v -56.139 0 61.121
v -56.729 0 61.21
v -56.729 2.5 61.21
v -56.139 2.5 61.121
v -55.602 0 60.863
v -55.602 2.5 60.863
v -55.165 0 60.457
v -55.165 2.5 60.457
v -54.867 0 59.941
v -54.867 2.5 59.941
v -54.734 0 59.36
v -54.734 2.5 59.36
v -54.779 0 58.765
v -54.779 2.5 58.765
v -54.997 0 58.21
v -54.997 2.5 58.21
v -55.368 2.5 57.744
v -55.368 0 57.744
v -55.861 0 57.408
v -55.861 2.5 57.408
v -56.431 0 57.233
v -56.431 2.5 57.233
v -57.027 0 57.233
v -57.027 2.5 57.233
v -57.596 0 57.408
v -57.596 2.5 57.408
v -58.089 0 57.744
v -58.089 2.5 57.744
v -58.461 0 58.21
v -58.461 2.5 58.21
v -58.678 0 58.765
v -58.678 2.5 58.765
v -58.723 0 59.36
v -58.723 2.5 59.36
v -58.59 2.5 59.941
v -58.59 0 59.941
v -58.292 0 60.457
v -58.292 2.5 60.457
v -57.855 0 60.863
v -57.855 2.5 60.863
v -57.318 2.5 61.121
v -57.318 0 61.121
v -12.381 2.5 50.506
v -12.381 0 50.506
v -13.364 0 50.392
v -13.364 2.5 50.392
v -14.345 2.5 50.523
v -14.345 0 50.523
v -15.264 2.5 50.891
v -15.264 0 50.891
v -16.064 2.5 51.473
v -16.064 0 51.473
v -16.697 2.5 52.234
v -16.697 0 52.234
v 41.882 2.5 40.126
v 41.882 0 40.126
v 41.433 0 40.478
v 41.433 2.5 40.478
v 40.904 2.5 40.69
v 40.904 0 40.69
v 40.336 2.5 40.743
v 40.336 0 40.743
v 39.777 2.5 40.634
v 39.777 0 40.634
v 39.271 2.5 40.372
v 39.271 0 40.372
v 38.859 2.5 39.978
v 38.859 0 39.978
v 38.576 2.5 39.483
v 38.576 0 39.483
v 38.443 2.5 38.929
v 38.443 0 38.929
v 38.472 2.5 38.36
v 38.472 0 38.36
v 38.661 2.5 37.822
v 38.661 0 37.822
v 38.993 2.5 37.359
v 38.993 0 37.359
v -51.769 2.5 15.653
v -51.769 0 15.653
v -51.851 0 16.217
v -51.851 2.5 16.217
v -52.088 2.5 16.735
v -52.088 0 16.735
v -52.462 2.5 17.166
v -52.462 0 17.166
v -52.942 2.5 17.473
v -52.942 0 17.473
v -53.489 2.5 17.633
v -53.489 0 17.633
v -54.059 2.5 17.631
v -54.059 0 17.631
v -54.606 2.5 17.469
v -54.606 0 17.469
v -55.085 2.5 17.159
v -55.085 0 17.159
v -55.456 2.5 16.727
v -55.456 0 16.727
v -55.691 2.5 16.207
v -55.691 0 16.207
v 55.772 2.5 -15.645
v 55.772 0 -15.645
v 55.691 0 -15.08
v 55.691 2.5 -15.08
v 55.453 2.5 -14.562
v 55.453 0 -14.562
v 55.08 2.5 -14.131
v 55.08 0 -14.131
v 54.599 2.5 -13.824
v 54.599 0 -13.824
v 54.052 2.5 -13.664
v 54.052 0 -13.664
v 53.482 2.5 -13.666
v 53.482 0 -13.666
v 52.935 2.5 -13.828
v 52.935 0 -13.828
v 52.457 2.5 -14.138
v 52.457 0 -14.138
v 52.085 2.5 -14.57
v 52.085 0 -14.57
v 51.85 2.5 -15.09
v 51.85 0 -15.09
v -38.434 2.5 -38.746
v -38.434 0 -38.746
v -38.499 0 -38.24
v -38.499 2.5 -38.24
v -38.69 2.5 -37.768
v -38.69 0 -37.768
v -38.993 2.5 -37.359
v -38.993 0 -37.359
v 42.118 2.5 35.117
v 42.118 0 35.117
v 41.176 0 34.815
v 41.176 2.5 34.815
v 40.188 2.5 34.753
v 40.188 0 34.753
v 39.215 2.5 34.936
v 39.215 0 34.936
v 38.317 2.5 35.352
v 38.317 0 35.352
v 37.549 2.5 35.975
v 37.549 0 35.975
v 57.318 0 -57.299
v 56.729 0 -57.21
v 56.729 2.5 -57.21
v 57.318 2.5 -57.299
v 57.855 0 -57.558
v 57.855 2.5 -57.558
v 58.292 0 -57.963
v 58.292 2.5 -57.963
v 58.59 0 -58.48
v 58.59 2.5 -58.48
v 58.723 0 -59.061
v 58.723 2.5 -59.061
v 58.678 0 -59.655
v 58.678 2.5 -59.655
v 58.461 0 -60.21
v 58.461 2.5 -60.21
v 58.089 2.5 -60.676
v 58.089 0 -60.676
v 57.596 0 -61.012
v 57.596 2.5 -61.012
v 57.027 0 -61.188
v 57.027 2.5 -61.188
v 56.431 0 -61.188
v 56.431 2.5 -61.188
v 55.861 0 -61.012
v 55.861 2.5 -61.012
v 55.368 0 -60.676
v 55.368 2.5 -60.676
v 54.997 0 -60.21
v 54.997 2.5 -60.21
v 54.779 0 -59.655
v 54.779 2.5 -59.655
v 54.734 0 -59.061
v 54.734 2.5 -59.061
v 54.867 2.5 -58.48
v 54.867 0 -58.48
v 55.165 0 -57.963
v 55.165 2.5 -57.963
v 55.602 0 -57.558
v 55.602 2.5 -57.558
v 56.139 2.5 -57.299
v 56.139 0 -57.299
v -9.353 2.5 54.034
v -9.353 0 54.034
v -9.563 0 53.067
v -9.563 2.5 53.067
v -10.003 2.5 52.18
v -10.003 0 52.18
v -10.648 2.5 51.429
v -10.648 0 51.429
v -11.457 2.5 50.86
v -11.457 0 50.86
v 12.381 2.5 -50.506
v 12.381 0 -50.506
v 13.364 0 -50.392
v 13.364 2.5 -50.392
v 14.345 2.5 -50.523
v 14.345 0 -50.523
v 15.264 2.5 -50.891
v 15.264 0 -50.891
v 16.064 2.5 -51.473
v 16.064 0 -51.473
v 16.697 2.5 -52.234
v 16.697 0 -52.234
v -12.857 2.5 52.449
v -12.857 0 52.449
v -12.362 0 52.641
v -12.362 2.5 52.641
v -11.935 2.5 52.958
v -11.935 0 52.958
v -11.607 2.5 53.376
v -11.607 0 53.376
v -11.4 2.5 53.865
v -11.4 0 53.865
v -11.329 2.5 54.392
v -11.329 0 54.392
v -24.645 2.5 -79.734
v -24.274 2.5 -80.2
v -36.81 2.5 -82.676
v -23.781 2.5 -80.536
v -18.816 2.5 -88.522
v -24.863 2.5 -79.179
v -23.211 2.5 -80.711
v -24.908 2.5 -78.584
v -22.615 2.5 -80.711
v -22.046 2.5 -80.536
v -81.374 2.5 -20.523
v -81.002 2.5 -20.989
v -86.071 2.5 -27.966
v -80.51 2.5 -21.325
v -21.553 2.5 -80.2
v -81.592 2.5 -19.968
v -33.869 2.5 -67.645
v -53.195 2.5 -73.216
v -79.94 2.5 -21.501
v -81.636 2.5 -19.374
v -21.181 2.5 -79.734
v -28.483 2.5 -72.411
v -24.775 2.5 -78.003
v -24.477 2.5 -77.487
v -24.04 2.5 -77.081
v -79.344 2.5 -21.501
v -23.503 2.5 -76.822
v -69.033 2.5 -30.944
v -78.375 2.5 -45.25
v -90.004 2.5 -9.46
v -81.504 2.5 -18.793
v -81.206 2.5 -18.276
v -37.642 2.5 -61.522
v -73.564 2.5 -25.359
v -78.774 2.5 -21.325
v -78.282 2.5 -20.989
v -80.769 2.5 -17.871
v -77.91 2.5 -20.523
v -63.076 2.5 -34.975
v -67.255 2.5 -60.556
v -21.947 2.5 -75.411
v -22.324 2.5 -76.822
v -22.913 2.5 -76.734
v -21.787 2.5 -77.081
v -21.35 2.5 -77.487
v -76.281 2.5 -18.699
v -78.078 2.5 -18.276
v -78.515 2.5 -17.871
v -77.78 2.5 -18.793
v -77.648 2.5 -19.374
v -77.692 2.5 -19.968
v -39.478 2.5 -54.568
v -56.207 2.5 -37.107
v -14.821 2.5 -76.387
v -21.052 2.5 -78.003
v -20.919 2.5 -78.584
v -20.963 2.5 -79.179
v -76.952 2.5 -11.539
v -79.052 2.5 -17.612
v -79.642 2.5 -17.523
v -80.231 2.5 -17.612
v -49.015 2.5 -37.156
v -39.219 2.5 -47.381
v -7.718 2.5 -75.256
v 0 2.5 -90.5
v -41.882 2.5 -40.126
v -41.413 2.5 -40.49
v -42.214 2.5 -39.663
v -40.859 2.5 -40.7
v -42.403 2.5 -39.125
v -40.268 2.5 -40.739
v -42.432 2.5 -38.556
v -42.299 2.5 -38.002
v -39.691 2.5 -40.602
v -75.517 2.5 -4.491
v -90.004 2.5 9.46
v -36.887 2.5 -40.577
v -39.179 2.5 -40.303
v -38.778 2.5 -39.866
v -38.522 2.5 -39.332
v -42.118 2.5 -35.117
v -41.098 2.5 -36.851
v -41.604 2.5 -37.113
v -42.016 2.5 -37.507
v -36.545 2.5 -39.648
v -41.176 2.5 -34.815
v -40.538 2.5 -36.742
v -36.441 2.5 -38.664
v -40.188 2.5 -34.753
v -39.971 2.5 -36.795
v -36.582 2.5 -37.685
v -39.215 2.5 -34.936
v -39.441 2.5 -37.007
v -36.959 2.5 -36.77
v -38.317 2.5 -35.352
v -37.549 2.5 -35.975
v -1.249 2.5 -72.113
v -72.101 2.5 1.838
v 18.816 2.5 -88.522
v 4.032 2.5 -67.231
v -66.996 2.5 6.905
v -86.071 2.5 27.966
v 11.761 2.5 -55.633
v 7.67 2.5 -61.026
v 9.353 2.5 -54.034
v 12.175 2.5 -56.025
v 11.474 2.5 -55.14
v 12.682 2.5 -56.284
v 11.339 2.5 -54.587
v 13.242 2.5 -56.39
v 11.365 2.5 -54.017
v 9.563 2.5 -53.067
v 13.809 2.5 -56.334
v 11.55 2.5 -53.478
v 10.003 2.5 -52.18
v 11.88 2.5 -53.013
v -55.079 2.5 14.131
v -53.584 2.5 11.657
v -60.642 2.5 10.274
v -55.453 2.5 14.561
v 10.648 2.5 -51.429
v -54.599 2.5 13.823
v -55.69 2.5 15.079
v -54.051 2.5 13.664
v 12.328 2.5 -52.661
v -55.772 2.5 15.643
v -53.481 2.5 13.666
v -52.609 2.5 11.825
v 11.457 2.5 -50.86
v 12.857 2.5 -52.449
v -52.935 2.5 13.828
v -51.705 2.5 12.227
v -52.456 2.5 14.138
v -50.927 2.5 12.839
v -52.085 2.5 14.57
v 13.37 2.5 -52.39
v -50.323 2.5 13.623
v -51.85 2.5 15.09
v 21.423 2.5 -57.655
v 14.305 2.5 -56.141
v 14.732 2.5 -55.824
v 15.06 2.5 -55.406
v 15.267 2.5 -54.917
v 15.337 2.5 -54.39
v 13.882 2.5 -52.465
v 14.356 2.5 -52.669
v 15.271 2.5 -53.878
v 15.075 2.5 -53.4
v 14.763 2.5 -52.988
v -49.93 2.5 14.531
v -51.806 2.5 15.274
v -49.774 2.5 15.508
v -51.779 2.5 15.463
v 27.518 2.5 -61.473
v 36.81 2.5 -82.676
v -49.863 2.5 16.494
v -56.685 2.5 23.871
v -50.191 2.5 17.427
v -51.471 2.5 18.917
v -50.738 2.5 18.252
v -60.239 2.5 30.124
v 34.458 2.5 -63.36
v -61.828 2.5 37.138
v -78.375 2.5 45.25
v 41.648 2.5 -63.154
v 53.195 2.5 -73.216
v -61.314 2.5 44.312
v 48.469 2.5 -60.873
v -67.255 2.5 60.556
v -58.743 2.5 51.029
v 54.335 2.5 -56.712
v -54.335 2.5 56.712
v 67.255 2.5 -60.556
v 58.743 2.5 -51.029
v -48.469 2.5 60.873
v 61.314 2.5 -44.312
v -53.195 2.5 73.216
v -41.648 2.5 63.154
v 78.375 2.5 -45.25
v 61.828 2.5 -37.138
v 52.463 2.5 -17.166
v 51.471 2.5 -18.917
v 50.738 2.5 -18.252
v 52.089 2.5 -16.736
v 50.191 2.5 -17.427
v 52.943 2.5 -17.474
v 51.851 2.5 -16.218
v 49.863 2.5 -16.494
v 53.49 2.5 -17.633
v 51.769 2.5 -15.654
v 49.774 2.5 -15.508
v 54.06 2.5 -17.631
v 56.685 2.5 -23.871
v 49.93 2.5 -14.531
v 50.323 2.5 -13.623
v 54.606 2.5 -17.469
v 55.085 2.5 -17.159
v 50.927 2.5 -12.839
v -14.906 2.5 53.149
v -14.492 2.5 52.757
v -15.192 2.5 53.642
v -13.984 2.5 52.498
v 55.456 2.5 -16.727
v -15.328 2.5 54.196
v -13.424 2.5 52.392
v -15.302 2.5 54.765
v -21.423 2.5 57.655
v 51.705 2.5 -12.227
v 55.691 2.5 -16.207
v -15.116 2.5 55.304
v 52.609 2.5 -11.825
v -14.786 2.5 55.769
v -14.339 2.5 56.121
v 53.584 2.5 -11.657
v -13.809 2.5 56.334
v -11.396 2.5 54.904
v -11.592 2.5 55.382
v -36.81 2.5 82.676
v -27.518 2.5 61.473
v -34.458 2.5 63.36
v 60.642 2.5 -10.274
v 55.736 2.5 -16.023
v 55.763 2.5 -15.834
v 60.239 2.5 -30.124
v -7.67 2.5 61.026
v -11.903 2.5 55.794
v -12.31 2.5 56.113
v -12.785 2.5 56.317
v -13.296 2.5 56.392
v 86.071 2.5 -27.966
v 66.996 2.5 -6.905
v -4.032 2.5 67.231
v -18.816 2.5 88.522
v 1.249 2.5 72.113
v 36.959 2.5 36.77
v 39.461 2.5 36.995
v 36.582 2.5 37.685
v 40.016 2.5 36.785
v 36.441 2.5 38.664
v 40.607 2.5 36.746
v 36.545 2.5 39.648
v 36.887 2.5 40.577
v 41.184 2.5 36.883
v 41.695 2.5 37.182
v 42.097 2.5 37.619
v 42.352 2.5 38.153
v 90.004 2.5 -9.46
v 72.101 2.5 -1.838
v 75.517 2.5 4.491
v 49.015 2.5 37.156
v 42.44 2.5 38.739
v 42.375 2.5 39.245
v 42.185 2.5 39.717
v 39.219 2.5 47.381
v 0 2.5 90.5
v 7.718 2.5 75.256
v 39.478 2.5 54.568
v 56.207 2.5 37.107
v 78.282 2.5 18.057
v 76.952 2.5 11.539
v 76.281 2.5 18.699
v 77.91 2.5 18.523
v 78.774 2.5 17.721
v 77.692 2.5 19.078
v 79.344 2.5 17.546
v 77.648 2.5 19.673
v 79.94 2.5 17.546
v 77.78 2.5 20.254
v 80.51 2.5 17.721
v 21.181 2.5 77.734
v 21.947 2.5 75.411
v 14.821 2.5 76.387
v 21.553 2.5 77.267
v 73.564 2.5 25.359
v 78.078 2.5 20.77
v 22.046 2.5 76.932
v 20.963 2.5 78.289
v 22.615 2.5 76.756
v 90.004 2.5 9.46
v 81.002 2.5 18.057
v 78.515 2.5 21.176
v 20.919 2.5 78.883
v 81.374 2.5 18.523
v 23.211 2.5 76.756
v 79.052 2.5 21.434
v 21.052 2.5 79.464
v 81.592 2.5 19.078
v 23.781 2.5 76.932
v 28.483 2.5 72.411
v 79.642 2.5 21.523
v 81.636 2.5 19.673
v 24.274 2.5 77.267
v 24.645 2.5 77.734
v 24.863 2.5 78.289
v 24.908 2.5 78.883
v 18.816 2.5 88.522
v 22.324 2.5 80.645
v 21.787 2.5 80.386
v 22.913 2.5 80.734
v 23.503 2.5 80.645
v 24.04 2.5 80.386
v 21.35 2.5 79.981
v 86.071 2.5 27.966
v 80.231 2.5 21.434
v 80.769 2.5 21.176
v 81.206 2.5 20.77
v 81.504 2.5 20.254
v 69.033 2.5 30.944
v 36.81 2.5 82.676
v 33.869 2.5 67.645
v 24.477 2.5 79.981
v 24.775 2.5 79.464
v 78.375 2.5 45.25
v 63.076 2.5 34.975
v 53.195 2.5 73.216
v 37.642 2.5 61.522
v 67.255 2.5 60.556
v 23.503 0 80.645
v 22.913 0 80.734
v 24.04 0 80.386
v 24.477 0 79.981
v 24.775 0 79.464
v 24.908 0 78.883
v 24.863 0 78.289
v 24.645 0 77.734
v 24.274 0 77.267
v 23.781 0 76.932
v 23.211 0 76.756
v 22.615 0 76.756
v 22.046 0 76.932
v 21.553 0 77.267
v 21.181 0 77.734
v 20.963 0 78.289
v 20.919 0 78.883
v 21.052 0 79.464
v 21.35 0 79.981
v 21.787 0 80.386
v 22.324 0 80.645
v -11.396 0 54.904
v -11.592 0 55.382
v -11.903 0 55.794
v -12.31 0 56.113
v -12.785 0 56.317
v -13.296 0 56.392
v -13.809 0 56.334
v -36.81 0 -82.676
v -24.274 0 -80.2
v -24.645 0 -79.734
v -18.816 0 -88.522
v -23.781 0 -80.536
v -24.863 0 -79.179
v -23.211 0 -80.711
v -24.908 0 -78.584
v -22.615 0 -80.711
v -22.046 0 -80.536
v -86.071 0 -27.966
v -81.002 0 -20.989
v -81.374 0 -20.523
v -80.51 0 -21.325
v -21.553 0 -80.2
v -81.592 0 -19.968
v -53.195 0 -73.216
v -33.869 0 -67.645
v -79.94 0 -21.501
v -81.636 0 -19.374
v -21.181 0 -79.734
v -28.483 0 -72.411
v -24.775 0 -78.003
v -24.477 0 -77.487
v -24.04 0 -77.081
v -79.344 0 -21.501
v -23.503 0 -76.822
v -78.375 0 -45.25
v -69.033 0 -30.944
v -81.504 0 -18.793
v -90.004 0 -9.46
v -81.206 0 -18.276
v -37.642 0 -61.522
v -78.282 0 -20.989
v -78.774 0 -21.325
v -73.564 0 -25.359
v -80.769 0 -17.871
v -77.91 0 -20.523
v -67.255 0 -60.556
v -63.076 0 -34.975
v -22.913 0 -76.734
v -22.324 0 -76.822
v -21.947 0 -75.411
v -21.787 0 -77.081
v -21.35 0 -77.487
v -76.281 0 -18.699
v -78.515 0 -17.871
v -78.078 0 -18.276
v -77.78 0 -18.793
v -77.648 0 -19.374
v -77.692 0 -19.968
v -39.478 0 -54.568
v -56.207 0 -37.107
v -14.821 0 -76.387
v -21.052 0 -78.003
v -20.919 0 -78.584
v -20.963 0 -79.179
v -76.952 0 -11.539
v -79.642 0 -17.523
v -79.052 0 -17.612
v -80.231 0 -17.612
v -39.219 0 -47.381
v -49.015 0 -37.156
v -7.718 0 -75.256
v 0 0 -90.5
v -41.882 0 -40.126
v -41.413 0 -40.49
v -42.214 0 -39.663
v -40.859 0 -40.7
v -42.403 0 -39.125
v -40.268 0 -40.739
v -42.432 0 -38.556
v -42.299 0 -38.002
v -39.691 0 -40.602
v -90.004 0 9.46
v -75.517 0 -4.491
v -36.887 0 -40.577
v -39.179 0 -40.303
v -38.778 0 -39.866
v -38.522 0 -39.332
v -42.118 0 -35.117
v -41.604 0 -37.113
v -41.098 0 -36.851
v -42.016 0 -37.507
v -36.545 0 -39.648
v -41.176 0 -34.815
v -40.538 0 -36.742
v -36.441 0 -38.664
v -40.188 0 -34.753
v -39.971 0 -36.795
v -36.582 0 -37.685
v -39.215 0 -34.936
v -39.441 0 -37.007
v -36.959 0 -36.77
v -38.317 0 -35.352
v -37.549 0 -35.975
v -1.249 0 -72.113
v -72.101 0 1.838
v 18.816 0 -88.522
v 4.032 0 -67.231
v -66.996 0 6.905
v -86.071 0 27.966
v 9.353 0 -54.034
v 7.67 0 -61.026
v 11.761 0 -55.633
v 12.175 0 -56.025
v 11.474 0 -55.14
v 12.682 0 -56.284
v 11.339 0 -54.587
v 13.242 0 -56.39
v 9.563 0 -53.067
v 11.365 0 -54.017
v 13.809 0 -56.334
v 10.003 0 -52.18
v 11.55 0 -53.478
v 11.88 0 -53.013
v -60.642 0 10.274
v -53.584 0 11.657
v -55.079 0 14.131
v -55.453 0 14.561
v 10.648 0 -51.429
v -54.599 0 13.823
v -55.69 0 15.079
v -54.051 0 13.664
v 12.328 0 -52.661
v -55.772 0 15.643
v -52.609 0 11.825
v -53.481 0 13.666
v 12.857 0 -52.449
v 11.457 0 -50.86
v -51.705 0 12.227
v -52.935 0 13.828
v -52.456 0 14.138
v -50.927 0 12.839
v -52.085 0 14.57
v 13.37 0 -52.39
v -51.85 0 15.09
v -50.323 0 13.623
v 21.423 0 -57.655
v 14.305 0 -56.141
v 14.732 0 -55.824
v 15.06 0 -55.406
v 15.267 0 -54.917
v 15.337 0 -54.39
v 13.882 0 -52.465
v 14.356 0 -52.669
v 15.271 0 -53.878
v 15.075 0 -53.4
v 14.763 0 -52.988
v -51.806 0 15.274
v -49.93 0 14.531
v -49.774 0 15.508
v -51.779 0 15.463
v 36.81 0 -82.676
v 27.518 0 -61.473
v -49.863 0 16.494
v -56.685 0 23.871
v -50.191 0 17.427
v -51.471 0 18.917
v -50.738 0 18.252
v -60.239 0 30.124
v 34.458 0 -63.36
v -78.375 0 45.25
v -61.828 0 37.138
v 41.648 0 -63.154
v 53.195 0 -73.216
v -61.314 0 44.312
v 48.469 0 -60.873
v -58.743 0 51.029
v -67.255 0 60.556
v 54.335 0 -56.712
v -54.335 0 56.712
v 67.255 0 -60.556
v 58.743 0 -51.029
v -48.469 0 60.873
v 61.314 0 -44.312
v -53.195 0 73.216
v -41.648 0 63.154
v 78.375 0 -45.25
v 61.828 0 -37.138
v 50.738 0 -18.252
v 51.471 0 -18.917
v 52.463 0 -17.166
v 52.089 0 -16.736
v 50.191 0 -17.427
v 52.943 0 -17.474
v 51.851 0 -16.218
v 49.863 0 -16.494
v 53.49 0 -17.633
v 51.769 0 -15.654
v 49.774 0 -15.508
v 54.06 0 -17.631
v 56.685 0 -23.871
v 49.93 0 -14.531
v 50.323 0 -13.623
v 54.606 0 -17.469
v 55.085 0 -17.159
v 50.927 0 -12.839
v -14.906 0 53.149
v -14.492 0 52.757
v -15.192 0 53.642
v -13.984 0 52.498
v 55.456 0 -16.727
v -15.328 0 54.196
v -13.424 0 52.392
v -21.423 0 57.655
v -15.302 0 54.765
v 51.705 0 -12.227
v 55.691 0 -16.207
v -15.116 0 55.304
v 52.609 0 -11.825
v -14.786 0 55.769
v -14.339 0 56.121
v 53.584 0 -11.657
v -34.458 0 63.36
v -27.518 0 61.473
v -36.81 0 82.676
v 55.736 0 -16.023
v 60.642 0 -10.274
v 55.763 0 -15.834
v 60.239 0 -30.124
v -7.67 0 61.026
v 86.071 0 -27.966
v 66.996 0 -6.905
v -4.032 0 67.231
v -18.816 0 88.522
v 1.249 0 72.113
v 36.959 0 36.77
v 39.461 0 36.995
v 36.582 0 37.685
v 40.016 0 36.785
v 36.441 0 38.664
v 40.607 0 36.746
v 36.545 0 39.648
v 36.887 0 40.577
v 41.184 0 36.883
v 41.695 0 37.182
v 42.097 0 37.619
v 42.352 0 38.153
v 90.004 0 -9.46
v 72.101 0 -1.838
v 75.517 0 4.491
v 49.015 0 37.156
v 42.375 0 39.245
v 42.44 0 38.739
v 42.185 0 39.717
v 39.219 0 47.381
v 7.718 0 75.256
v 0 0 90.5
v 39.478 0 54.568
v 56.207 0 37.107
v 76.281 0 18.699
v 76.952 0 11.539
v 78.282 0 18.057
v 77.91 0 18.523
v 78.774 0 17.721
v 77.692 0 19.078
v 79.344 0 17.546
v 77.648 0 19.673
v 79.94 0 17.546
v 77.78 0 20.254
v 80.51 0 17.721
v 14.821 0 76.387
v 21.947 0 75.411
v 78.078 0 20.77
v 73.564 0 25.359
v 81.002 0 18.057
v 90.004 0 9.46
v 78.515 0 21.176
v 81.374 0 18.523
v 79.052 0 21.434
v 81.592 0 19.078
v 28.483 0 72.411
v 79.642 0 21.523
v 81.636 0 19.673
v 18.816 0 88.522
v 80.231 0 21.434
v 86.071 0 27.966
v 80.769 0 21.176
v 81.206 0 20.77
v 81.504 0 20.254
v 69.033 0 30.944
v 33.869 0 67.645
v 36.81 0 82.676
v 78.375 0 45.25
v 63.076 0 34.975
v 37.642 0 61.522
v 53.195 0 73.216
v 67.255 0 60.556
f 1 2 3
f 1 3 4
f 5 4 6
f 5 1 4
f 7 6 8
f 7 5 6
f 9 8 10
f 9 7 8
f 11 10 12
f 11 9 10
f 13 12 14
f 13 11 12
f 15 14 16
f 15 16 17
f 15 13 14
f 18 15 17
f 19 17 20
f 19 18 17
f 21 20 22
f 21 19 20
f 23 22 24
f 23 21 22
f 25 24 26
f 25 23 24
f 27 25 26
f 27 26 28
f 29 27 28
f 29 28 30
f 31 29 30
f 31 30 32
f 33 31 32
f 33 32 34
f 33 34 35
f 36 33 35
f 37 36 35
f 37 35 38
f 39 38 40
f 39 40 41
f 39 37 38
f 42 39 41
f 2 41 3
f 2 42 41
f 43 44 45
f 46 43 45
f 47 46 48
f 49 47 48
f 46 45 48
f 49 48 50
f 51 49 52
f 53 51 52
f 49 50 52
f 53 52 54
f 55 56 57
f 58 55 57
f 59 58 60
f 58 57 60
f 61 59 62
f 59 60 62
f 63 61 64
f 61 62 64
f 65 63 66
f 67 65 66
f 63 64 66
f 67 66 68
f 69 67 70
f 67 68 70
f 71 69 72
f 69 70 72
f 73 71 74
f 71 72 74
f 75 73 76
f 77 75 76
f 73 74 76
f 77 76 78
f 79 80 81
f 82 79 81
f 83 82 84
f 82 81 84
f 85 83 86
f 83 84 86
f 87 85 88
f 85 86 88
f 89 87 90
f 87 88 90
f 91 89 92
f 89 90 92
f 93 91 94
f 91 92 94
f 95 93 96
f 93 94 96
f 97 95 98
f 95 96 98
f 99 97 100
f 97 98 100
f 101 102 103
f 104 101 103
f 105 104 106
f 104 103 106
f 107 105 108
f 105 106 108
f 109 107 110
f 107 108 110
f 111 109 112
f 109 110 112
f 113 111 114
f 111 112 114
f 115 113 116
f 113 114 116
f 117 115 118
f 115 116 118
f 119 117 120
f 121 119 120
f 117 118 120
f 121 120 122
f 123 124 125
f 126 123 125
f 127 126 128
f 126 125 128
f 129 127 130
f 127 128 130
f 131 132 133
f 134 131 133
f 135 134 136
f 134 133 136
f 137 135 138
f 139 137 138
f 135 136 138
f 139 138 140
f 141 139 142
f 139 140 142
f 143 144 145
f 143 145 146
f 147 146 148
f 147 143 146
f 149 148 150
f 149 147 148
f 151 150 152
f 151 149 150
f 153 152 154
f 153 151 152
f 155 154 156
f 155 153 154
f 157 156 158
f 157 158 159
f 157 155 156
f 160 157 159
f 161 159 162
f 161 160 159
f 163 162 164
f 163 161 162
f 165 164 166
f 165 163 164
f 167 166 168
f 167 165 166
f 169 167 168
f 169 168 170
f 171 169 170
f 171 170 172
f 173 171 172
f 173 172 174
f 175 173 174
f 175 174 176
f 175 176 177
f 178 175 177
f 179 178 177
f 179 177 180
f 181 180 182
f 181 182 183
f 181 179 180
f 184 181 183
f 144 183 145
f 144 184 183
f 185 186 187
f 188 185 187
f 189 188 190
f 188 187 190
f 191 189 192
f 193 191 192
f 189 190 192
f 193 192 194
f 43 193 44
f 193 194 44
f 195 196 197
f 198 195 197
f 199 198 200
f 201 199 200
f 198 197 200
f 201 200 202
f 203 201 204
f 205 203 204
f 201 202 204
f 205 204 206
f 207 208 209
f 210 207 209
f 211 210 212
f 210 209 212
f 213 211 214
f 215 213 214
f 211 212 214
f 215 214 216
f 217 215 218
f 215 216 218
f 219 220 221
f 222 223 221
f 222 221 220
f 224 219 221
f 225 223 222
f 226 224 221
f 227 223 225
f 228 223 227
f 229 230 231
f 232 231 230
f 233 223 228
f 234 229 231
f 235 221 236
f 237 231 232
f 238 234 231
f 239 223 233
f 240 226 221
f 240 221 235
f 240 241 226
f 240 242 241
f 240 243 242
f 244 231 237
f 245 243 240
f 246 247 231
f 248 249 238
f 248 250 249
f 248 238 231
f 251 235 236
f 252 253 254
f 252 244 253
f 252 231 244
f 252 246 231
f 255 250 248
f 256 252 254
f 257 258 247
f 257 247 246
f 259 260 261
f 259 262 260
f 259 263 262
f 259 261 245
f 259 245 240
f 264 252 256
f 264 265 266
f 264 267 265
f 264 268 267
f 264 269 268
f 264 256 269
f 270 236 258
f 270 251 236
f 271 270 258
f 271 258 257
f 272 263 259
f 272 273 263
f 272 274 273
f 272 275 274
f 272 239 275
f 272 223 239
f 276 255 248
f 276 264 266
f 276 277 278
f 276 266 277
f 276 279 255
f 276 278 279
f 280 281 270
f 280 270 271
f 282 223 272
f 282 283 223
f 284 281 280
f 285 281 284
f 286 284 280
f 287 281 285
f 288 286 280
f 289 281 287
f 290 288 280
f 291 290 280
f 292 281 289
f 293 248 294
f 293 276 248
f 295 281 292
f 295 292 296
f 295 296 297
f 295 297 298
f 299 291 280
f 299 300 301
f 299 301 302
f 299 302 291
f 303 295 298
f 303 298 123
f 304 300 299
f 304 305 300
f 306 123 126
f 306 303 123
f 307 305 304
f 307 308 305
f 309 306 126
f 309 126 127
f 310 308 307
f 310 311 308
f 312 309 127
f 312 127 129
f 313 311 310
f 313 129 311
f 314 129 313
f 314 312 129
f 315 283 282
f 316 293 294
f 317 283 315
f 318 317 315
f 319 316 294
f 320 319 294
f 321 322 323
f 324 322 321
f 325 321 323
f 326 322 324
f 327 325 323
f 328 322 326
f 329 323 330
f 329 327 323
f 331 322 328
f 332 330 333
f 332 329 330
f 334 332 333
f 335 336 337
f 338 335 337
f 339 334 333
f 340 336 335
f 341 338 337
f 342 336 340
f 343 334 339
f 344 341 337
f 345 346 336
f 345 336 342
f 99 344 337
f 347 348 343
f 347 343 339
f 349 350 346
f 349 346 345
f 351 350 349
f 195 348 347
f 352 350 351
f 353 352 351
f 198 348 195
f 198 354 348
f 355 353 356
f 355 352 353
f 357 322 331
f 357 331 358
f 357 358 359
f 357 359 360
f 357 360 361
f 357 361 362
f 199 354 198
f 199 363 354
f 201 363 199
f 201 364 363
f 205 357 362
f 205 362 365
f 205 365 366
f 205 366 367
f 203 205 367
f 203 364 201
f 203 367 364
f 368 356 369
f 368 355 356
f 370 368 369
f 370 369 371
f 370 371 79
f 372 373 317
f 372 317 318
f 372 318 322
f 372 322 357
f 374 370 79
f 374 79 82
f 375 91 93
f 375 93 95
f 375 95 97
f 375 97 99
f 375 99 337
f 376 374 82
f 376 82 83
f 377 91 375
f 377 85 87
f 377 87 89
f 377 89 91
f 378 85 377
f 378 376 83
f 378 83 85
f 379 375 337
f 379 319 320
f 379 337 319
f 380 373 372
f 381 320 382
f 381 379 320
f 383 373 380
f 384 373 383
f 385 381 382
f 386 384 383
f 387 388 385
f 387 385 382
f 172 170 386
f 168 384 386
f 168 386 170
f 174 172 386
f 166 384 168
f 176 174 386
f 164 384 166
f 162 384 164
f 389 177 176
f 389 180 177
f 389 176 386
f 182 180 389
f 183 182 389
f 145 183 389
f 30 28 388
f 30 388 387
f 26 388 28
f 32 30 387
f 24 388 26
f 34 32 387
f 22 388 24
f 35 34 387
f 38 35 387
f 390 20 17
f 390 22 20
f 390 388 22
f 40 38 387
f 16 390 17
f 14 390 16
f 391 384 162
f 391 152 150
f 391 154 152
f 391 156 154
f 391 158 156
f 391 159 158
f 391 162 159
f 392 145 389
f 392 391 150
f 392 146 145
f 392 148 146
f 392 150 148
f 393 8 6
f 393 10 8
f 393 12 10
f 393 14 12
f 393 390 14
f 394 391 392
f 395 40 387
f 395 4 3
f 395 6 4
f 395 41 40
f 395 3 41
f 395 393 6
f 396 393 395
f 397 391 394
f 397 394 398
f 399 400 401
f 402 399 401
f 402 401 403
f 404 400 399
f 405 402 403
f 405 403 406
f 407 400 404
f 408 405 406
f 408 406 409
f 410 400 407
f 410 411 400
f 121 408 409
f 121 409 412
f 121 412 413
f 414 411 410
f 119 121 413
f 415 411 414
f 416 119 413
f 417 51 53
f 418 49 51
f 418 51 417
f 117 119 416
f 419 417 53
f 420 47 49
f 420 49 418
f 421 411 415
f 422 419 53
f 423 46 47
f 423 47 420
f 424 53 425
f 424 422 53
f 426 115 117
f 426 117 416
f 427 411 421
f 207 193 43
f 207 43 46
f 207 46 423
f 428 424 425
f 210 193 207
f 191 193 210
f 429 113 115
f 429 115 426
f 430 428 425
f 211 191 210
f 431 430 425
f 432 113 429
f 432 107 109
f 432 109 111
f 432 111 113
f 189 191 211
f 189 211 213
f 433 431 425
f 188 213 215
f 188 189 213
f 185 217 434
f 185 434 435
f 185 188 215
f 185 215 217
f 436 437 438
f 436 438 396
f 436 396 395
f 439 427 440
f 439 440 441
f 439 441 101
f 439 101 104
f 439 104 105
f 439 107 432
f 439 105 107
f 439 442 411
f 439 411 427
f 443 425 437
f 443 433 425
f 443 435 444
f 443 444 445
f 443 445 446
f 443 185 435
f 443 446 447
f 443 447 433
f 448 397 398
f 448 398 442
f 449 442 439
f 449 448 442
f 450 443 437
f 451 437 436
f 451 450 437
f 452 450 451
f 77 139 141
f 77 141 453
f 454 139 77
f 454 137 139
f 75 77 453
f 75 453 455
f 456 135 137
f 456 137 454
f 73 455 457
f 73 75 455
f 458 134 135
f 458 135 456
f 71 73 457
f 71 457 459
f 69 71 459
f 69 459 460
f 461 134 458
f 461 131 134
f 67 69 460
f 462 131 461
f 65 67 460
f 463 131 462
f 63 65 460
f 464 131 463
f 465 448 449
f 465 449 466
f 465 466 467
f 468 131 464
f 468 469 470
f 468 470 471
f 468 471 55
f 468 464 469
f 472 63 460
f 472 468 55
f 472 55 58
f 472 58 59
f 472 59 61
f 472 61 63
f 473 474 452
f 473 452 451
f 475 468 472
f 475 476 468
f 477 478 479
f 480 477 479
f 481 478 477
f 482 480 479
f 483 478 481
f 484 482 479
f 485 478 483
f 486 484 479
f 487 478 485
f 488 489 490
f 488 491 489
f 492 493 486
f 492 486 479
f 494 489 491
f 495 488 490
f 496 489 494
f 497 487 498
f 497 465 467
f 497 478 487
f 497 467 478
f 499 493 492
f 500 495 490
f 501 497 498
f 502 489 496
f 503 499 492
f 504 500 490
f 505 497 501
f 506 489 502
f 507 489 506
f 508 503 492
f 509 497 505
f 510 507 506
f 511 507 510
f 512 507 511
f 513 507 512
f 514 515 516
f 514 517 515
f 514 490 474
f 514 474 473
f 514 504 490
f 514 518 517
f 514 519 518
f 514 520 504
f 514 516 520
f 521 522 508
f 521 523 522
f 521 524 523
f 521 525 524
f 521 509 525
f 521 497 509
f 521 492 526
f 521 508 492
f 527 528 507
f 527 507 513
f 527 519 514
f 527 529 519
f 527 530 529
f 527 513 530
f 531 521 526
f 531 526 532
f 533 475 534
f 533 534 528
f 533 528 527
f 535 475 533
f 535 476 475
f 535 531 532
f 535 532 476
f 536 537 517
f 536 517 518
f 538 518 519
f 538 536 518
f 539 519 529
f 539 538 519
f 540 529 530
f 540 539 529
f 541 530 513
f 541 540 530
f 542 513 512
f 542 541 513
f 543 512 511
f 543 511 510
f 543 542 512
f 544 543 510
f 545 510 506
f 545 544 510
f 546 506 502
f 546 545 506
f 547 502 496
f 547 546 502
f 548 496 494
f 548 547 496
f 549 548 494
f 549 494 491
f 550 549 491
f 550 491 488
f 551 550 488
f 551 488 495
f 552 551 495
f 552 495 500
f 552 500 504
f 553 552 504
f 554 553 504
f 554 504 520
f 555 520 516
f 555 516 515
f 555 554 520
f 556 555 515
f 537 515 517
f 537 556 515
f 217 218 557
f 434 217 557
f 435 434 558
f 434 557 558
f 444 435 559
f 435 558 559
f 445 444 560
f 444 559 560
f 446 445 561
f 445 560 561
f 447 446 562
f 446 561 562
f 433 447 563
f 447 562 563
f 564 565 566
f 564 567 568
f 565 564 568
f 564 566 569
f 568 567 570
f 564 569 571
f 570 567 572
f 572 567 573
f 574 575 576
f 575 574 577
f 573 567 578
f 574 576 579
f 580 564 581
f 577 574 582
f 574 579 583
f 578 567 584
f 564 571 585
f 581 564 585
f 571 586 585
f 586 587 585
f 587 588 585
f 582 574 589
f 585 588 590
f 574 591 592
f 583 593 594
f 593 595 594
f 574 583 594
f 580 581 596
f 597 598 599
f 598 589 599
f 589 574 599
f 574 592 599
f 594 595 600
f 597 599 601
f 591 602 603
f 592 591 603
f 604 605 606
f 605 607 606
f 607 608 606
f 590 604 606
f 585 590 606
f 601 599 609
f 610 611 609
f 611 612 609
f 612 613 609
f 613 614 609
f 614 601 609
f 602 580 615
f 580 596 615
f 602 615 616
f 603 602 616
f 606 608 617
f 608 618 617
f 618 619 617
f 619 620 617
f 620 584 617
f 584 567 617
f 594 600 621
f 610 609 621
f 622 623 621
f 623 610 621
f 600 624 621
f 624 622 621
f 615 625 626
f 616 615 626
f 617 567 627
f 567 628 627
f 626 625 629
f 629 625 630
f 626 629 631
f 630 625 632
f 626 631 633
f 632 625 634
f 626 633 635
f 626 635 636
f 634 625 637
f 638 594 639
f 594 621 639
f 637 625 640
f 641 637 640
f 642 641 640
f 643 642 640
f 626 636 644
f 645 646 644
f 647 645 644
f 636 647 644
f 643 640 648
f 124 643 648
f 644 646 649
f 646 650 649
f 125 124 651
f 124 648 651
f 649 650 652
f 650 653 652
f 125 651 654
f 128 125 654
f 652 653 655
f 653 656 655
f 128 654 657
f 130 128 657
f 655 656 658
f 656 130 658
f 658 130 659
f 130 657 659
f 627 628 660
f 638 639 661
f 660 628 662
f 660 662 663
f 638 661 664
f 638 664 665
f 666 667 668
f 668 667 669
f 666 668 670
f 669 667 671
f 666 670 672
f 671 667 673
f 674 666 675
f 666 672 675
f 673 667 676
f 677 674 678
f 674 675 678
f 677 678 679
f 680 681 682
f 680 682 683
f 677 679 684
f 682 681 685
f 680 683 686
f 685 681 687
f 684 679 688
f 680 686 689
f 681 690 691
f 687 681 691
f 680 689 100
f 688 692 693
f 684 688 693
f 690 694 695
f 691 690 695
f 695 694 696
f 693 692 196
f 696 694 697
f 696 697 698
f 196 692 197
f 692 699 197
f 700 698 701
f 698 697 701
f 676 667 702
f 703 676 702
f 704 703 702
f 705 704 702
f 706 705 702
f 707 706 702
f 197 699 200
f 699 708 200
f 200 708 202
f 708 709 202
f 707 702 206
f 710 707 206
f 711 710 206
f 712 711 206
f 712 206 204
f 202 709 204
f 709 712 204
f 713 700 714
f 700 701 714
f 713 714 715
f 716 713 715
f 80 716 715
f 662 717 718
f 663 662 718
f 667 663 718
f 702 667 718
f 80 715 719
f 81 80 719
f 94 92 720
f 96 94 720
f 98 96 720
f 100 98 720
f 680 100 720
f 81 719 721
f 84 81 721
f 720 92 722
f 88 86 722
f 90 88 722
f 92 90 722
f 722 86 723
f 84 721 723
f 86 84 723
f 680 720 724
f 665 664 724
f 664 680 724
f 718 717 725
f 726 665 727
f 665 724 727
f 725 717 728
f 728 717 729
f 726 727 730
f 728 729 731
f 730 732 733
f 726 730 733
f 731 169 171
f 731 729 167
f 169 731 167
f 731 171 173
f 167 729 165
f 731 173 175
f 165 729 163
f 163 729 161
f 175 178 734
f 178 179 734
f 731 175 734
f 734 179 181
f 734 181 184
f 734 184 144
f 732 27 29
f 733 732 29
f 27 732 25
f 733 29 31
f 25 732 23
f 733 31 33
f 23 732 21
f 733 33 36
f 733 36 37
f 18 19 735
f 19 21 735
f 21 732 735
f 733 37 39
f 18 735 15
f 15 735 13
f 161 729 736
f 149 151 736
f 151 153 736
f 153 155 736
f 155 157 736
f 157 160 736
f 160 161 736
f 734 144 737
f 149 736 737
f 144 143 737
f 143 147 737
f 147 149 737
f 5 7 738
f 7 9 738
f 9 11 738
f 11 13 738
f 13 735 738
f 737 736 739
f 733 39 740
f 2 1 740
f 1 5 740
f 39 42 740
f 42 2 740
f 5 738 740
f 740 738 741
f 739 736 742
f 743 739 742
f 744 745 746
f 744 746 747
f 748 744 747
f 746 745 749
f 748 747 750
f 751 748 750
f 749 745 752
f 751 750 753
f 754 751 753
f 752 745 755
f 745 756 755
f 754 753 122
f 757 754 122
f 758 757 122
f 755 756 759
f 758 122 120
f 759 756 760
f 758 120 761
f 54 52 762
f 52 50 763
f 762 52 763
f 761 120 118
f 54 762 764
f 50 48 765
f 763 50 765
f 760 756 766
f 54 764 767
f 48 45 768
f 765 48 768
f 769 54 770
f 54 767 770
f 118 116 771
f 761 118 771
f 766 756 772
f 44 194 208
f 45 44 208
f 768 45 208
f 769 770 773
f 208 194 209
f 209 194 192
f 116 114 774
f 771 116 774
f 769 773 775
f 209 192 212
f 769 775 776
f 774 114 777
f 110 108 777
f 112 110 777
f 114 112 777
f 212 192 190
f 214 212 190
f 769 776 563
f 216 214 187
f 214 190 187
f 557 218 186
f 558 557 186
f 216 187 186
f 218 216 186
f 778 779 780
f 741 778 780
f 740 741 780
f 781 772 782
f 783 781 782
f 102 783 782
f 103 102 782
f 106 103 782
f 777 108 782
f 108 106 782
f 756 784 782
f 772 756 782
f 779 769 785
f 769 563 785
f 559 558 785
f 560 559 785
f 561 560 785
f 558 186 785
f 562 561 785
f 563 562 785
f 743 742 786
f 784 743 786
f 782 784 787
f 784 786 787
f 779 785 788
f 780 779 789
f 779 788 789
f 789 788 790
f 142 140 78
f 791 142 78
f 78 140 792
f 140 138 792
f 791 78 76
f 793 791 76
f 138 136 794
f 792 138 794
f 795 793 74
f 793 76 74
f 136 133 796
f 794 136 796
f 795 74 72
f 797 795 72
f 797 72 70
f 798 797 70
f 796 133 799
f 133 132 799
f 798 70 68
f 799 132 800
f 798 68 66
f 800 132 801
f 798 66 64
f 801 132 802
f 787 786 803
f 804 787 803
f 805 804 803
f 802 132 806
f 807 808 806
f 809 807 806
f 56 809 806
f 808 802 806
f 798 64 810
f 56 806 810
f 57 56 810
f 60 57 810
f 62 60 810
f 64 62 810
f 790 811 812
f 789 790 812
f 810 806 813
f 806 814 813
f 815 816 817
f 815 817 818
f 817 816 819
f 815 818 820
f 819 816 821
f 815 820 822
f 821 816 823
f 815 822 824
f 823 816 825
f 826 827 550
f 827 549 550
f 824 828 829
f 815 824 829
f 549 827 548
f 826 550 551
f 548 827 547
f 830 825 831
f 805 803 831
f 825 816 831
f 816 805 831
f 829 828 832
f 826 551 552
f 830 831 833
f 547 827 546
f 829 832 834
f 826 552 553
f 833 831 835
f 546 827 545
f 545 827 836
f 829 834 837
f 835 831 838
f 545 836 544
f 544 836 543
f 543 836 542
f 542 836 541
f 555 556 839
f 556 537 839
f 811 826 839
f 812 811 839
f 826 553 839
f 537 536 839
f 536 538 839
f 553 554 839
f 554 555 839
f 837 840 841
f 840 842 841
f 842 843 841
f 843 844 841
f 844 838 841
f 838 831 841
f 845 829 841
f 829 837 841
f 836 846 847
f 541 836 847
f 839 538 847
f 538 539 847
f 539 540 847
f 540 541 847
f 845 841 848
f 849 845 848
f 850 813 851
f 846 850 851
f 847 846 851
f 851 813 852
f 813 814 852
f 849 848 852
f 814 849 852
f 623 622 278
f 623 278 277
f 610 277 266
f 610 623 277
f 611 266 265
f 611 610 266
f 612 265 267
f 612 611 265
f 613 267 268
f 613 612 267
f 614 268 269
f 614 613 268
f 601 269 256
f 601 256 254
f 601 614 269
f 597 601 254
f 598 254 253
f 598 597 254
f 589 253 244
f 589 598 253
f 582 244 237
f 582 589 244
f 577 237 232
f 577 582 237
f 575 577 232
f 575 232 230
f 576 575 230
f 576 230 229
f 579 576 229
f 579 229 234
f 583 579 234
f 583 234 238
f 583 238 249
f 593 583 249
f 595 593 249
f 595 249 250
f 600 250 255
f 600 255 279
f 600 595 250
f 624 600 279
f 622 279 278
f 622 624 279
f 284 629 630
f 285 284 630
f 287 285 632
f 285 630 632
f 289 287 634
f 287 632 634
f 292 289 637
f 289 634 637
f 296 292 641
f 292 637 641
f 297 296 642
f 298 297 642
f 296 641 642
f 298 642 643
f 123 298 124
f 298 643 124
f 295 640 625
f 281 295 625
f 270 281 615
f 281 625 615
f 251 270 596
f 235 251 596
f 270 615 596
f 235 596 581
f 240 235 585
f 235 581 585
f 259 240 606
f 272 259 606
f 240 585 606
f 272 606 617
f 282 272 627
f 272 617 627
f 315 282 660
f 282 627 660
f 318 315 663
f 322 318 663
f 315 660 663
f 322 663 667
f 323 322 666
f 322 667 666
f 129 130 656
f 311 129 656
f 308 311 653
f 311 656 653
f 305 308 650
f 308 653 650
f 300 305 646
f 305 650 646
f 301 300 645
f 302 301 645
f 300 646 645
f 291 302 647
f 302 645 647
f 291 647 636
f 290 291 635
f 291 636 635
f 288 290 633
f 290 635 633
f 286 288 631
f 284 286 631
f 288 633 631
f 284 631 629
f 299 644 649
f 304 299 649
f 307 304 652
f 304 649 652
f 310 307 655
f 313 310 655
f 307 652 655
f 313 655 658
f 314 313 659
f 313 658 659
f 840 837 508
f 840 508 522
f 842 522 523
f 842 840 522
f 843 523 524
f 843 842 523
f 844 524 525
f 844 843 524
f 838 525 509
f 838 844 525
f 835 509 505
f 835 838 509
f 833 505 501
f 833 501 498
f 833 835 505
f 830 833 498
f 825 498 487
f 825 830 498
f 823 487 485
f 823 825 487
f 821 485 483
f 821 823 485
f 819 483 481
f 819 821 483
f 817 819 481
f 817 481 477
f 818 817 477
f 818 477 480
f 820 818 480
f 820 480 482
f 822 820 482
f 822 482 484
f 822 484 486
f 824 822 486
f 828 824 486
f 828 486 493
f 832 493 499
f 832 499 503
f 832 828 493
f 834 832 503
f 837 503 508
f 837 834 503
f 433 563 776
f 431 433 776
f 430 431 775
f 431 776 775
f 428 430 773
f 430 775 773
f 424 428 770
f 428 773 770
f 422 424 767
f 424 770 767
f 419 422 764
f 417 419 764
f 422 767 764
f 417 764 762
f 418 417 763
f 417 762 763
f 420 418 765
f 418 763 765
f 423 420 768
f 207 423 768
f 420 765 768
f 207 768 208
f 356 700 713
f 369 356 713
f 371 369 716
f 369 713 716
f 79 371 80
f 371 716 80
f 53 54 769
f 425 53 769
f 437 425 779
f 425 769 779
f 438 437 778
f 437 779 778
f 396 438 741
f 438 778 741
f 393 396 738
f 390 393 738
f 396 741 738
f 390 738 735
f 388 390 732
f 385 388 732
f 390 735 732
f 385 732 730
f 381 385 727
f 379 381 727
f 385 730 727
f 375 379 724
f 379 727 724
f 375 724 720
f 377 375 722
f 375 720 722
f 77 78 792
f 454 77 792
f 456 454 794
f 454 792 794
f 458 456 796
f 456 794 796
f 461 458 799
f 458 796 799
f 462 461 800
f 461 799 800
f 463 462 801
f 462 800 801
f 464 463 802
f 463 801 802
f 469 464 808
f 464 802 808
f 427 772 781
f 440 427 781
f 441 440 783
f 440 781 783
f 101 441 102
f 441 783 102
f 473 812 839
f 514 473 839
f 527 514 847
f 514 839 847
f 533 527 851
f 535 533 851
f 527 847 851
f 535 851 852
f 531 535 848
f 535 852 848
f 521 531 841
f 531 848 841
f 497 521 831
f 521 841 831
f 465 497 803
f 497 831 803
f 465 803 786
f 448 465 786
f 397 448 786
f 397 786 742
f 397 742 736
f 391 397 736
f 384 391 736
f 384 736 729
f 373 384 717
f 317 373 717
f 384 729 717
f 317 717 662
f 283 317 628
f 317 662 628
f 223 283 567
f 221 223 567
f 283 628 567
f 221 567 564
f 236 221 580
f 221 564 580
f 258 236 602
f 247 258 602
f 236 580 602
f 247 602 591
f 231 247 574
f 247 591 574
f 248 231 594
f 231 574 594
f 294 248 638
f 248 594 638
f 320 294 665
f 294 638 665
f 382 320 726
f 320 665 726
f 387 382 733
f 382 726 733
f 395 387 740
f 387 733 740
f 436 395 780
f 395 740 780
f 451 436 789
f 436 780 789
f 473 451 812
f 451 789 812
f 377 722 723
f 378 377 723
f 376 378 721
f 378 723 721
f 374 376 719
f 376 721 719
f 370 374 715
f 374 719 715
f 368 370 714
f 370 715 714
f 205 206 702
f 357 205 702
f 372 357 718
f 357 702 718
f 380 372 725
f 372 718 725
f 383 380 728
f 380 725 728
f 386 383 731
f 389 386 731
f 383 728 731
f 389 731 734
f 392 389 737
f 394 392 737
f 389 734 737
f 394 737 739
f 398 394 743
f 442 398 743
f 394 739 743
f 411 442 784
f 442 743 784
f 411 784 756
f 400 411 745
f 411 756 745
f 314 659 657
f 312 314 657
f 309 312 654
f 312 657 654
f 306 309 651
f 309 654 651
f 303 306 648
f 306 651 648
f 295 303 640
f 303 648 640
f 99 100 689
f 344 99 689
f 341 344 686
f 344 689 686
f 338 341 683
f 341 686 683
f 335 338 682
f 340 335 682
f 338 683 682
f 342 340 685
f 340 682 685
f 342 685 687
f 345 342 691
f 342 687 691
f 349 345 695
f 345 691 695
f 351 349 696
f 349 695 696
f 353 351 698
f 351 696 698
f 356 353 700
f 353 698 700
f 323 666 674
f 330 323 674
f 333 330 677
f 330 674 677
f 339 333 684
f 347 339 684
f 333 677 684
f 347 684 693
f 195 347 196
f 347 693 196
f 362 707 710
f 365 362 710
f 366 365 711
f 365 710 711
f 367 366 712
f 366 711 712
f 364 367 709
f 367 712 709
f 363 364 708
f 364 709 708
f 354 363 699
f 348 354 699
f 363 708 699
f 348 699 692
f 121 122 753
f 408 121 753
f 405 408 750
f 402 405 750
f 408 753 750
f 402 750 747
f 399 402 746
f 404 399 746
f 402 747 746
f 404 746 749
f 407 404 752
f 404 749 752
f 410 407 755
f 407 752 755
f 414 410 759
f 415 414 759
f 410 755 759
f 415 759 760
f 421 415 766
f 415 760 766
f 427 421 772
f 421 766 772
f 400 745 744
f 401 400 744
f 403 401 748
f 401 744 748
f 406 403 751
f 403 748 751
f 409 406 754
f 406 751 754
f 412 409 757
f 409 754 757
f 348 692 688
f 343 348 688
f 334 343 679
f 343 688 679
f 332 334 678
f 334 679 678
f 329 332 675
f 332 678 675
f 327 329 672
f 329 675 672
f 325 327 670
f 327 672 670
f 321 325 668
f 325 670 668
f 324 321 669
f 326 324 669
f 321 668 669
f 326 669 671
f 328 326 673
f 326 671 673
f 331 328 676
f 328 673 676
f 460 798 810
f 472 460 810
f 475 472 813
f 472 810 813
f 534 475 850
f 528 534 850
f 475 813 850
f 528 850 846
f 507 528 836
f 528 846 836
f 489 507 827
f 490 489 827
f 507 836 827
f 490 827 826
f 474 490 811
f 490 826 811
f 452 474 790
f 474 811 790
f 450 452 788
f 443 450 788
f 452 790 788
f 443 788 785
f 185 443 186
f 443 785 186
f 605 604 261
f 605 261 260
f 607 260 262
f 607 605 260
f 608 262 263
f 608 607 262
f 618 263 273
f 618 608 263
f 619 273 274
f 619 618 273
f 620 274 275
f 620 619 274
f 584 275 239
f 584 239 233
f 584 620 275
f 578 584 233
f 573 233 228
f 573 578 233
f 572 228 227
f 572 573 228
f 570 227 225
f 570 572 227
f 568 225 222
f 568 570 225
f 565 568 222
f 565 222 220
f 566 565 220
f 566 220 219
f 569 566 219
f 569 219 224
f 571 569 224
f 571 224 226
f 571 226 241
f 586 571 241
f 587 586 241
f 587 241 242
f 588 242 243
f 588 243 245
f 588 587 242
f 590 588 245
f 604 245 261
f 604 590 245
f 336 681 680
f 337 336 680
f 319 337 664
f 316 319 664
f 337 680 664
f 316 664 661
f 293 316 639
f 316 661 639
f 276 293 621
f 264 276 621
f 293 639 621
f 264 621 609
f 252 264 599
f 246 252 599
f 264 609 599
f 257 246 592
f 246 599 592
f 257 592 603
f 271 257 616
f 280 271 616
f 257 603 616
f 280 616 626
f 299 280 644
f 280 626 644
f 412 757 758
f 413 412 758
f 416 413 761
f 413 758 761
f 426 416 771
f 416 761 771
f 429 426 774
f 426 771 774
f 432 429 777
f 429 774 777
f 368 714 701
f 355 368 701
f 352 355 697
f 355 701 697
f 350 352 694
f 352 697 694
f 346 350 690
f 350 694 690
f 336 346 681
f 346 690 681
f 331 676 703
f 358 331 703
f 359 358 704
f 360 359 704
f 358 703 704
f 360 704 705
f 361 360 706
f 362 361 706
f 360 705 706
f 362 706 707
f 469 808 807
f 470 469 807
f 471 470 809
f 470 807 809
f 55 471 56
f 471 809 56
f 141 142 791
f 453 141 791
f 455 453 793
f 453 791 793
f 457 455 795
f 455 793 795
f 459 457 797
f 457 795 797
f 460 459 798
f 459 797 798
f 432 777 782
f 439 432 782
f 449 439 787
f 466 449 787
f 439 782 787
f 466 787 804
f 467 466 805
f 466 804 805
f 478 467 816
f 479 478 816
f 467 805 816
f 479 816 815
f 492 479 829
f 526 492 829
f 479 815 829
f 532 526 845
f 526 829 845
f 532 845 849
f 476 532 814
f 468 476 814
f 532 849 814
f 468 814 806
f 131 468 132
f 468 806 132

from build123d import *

# Parameters (mm, degrees)
SKETCH1_R           = 90.5
SKETCH1_R_2         = 2
BOSS_EXTRUDE1_DEPTH = 2.5


with BuildPart() as part:
    # Sketch1 → Boss-Extrude1 (new body)
    with BuildSketch(Plane(origin=(0, 0, 0), x_dir=(1, 0, 0), z_dir=(0, 1, 0))):
        with Locations(Location((0, 0, 0), (0, 0, 270))):
            Circle(SKETCH1_R)
        with Locations(Location((-56.728619257, -59.210334885, 0), (0, 0, 270))):
            Circle(SKETCH1_R_2, mode=Mode.SUBTRACT)
        with BuildLine():
            ThreePointArc((-13.809474495, -56.333511054), (-15.279862915, -53.913851845), (-12.857122546, -52.448545769))
            ThreePointArc((-12.857122546, -52.448545769), (-11.756930203, -53.155944826), (-11.329221048, -54.392027954))
            ThreePointArc((-11.329221048, -54.392027954), (-12.096441038, -55.966909996), (-13.809474495, -56.333511054))
        make_face(mode=Mode.SUBTRACT)
        with BuildLine():
            ThreePointArc((-55.690988904, -16.207399802), (-54.330696771, -13.724176472), (-51.8503343, -15.08967814))
            ThreePointArc((-51.8503343, -15.08967814), (-51.789803118, -15.36823597), (-51.769488495, -15.652569937))
            ThreePointArc((-51.769488495, -15.652569937), (-53.48931071, -17.632847798), (-55.690988904, -16.207399802))
        make_face(mode=Mode.SUBTRACT)
        with Locations(Location((22.913344548, -78.733592841, 0), (0, 0, 270))):
            Circle(SKETCH1_R_2, mode=Mode.SUBTRACT)
        with BuildLine():
            ThreePointArc((41.88151441, -40.126111252), (39.050833856, -40.189675373), (38.993211754, -37.358867629))
            ThreePointArc((38.993211754, -37.358867629), (41.183869698, -36.882833205), (42.440267447, -38.739458017))
            ThreePointArc((42.440267447, -38.739458017), (42.295327275, -39.486955868), (41.88151441, -40.126111252))
        make_face(mode=Mode.SUBTRACT)
        with Locations(Location((79.641963805, -19.523257956, 0), (0, 0, 270))):
            Circle(SKETCH1_R_2, mode=Mode.SUBTRACT)
        with Locations(Location((-79.641963805, 19.523257956, 0), (0, 0, 270))):
            Circle(SKETCH1_R_2, mode=Mode.SUBTRACT)
        with BuildLine():
            ThreePointArc((-38.993211754, 37.358867629), (-41.823892307, 37.295303508), (-41.88151441, 40.126111252))
            ThreePointArc((-41.88151441, 40.126111252), (-39.690856466, 40.602145676), (-38.434458716, 38.745520864))
            ThreePointArc((-38.434458716, 38.745520864), (-38.579398889, 37.998023012), (-38.993211754, 37.358867629))
        make_face(mode=Mode.SUBTRACT)
        with Locations(Location((-22.913344548, 78.733592841, 0), (0, 0, 270))):
            Circle(SKETCH1_R_2, mode=Mode.SUBTRACT)
        with BuildLine():
            ThreePointArc((-36.887220248, 40.576808173), (-21.946513181, 75.411419289), (9.353262234, 54.033886264))
            ThreePointArc((9.353262234, 54.033886264), (10.301978002, 51.784964754), (12.380944998, 50.506056707))
            ThreePointArc((12.380944998, 50.506056707), (14.815689048, 50.678483436), (16.696936559, 52.233673896))
            ThreePointArc((16.696936559, 52.233673896), (54.33494825, 56.711947584), (51.471349286, 18.916780429))
            ThreePointArc((51.471349286, 18.916780429), (49.998084012, 16.970707718), (49.930000652, 14.530815462))
            ThreePointArc((49.930000652, 14.530815462), (51.296698605, 12.508478628), (53.584156807, 11.656865723))
            ThreePointArc((53.584156807, 11.656865723), (76.28146143, -18.699471706), (42.118087053, -35.117105834))
            ThreePointArc((42.118087053, -35.117105834), (39.69610601, -34.814257036), (37.549055654, -35.975241245))
            ThreePointArc((37.549055654, -35.975241245), (36.481009557, -38.170004808), (36.887220248, -40.576808173))
            ThreePointArc((36.887220248, -40.576808173), (21.946513181, -75.411419289), (-9.353262234, -54.033886264))
            ThreePointArc((-9.353262234, -54.033886264), (-10.301978002, -51.784964754), (-12.380944998, -50.506056707))
            ThreePointArc((-12.380944998, -50.506056707), (-14.815689048, -50.678483436), (-16.696936559, -52.233673896))
            ThreePointArc((-16.696936559, -52.233673896), (-54.33494825, -56.711947584), (-51.471349286, -18.916780429))
            ThreePointArc((-51.471349286, -18.916780429), (-49.998084012, -16.970707718), (-49.930000652, -14.530815462))
            ThreePointArc((-49.930000652, -14.530815462), (-51.296698605, -12.508478628), (-53.584156807, -11.656865723))
            ThreePointArc((-53.584156807, -11.656865723), (-76.28146143, 18.699471706), (-42.118087053, 35.117105834))
            ThreePointArc((-42.118087053, 35.117105834), (-39.69610601, 34.814257036), (-37.549055654, 35.975241245))
            ThreePointArc((-37.549055654, 35.975241245), (-36.481009557, 38.170004808), (-36.887220248, 40.576808173))
        make_face(mode=Mode.SUBTRACT)
        with BuildLine():
            ThreePointArc((55.690988904, 16.207399802), (55.751520087, 15.928841972), (55.771834709, 15.644508005))
            ThreePointArc((55.771834709, 15.644508005), (54.052012494, 13.664230143), (51.8503343, 15.08967814))
            ThreePointArc((51.8503343, 15.08967814), (53.210626433, 17.572901469), (55.690988904, 16.207399802))
        make_face(mode=Mode.SUBTRACT)
        with BuildLine():
            ThreePointArc((13.809474495, 56.333511054), (14.909666838, 55.626111996), (15.337375993, 54.390028868))
            ThreePointArc((15.337375993, 54.390028868), (14.570156003, 52.815146826), (12.857122546, 52.448545769))
            ThreePointArc((12.857122546, 52.448545769), (11.386734126, 54.868204977), (13.809474495, 56.333511054))
        make_face(mode=Mode.SUBTRACT)
        with Locations(Location((56.728619257, 59.210334885, 0), (0, 0, 270))):
            Circle(SKETCH1_R_2, mode=Mode.SUBTRACT)
    extrude(amount=BOSS_EXTRUDE1_DEPTH)


solid = part.part
